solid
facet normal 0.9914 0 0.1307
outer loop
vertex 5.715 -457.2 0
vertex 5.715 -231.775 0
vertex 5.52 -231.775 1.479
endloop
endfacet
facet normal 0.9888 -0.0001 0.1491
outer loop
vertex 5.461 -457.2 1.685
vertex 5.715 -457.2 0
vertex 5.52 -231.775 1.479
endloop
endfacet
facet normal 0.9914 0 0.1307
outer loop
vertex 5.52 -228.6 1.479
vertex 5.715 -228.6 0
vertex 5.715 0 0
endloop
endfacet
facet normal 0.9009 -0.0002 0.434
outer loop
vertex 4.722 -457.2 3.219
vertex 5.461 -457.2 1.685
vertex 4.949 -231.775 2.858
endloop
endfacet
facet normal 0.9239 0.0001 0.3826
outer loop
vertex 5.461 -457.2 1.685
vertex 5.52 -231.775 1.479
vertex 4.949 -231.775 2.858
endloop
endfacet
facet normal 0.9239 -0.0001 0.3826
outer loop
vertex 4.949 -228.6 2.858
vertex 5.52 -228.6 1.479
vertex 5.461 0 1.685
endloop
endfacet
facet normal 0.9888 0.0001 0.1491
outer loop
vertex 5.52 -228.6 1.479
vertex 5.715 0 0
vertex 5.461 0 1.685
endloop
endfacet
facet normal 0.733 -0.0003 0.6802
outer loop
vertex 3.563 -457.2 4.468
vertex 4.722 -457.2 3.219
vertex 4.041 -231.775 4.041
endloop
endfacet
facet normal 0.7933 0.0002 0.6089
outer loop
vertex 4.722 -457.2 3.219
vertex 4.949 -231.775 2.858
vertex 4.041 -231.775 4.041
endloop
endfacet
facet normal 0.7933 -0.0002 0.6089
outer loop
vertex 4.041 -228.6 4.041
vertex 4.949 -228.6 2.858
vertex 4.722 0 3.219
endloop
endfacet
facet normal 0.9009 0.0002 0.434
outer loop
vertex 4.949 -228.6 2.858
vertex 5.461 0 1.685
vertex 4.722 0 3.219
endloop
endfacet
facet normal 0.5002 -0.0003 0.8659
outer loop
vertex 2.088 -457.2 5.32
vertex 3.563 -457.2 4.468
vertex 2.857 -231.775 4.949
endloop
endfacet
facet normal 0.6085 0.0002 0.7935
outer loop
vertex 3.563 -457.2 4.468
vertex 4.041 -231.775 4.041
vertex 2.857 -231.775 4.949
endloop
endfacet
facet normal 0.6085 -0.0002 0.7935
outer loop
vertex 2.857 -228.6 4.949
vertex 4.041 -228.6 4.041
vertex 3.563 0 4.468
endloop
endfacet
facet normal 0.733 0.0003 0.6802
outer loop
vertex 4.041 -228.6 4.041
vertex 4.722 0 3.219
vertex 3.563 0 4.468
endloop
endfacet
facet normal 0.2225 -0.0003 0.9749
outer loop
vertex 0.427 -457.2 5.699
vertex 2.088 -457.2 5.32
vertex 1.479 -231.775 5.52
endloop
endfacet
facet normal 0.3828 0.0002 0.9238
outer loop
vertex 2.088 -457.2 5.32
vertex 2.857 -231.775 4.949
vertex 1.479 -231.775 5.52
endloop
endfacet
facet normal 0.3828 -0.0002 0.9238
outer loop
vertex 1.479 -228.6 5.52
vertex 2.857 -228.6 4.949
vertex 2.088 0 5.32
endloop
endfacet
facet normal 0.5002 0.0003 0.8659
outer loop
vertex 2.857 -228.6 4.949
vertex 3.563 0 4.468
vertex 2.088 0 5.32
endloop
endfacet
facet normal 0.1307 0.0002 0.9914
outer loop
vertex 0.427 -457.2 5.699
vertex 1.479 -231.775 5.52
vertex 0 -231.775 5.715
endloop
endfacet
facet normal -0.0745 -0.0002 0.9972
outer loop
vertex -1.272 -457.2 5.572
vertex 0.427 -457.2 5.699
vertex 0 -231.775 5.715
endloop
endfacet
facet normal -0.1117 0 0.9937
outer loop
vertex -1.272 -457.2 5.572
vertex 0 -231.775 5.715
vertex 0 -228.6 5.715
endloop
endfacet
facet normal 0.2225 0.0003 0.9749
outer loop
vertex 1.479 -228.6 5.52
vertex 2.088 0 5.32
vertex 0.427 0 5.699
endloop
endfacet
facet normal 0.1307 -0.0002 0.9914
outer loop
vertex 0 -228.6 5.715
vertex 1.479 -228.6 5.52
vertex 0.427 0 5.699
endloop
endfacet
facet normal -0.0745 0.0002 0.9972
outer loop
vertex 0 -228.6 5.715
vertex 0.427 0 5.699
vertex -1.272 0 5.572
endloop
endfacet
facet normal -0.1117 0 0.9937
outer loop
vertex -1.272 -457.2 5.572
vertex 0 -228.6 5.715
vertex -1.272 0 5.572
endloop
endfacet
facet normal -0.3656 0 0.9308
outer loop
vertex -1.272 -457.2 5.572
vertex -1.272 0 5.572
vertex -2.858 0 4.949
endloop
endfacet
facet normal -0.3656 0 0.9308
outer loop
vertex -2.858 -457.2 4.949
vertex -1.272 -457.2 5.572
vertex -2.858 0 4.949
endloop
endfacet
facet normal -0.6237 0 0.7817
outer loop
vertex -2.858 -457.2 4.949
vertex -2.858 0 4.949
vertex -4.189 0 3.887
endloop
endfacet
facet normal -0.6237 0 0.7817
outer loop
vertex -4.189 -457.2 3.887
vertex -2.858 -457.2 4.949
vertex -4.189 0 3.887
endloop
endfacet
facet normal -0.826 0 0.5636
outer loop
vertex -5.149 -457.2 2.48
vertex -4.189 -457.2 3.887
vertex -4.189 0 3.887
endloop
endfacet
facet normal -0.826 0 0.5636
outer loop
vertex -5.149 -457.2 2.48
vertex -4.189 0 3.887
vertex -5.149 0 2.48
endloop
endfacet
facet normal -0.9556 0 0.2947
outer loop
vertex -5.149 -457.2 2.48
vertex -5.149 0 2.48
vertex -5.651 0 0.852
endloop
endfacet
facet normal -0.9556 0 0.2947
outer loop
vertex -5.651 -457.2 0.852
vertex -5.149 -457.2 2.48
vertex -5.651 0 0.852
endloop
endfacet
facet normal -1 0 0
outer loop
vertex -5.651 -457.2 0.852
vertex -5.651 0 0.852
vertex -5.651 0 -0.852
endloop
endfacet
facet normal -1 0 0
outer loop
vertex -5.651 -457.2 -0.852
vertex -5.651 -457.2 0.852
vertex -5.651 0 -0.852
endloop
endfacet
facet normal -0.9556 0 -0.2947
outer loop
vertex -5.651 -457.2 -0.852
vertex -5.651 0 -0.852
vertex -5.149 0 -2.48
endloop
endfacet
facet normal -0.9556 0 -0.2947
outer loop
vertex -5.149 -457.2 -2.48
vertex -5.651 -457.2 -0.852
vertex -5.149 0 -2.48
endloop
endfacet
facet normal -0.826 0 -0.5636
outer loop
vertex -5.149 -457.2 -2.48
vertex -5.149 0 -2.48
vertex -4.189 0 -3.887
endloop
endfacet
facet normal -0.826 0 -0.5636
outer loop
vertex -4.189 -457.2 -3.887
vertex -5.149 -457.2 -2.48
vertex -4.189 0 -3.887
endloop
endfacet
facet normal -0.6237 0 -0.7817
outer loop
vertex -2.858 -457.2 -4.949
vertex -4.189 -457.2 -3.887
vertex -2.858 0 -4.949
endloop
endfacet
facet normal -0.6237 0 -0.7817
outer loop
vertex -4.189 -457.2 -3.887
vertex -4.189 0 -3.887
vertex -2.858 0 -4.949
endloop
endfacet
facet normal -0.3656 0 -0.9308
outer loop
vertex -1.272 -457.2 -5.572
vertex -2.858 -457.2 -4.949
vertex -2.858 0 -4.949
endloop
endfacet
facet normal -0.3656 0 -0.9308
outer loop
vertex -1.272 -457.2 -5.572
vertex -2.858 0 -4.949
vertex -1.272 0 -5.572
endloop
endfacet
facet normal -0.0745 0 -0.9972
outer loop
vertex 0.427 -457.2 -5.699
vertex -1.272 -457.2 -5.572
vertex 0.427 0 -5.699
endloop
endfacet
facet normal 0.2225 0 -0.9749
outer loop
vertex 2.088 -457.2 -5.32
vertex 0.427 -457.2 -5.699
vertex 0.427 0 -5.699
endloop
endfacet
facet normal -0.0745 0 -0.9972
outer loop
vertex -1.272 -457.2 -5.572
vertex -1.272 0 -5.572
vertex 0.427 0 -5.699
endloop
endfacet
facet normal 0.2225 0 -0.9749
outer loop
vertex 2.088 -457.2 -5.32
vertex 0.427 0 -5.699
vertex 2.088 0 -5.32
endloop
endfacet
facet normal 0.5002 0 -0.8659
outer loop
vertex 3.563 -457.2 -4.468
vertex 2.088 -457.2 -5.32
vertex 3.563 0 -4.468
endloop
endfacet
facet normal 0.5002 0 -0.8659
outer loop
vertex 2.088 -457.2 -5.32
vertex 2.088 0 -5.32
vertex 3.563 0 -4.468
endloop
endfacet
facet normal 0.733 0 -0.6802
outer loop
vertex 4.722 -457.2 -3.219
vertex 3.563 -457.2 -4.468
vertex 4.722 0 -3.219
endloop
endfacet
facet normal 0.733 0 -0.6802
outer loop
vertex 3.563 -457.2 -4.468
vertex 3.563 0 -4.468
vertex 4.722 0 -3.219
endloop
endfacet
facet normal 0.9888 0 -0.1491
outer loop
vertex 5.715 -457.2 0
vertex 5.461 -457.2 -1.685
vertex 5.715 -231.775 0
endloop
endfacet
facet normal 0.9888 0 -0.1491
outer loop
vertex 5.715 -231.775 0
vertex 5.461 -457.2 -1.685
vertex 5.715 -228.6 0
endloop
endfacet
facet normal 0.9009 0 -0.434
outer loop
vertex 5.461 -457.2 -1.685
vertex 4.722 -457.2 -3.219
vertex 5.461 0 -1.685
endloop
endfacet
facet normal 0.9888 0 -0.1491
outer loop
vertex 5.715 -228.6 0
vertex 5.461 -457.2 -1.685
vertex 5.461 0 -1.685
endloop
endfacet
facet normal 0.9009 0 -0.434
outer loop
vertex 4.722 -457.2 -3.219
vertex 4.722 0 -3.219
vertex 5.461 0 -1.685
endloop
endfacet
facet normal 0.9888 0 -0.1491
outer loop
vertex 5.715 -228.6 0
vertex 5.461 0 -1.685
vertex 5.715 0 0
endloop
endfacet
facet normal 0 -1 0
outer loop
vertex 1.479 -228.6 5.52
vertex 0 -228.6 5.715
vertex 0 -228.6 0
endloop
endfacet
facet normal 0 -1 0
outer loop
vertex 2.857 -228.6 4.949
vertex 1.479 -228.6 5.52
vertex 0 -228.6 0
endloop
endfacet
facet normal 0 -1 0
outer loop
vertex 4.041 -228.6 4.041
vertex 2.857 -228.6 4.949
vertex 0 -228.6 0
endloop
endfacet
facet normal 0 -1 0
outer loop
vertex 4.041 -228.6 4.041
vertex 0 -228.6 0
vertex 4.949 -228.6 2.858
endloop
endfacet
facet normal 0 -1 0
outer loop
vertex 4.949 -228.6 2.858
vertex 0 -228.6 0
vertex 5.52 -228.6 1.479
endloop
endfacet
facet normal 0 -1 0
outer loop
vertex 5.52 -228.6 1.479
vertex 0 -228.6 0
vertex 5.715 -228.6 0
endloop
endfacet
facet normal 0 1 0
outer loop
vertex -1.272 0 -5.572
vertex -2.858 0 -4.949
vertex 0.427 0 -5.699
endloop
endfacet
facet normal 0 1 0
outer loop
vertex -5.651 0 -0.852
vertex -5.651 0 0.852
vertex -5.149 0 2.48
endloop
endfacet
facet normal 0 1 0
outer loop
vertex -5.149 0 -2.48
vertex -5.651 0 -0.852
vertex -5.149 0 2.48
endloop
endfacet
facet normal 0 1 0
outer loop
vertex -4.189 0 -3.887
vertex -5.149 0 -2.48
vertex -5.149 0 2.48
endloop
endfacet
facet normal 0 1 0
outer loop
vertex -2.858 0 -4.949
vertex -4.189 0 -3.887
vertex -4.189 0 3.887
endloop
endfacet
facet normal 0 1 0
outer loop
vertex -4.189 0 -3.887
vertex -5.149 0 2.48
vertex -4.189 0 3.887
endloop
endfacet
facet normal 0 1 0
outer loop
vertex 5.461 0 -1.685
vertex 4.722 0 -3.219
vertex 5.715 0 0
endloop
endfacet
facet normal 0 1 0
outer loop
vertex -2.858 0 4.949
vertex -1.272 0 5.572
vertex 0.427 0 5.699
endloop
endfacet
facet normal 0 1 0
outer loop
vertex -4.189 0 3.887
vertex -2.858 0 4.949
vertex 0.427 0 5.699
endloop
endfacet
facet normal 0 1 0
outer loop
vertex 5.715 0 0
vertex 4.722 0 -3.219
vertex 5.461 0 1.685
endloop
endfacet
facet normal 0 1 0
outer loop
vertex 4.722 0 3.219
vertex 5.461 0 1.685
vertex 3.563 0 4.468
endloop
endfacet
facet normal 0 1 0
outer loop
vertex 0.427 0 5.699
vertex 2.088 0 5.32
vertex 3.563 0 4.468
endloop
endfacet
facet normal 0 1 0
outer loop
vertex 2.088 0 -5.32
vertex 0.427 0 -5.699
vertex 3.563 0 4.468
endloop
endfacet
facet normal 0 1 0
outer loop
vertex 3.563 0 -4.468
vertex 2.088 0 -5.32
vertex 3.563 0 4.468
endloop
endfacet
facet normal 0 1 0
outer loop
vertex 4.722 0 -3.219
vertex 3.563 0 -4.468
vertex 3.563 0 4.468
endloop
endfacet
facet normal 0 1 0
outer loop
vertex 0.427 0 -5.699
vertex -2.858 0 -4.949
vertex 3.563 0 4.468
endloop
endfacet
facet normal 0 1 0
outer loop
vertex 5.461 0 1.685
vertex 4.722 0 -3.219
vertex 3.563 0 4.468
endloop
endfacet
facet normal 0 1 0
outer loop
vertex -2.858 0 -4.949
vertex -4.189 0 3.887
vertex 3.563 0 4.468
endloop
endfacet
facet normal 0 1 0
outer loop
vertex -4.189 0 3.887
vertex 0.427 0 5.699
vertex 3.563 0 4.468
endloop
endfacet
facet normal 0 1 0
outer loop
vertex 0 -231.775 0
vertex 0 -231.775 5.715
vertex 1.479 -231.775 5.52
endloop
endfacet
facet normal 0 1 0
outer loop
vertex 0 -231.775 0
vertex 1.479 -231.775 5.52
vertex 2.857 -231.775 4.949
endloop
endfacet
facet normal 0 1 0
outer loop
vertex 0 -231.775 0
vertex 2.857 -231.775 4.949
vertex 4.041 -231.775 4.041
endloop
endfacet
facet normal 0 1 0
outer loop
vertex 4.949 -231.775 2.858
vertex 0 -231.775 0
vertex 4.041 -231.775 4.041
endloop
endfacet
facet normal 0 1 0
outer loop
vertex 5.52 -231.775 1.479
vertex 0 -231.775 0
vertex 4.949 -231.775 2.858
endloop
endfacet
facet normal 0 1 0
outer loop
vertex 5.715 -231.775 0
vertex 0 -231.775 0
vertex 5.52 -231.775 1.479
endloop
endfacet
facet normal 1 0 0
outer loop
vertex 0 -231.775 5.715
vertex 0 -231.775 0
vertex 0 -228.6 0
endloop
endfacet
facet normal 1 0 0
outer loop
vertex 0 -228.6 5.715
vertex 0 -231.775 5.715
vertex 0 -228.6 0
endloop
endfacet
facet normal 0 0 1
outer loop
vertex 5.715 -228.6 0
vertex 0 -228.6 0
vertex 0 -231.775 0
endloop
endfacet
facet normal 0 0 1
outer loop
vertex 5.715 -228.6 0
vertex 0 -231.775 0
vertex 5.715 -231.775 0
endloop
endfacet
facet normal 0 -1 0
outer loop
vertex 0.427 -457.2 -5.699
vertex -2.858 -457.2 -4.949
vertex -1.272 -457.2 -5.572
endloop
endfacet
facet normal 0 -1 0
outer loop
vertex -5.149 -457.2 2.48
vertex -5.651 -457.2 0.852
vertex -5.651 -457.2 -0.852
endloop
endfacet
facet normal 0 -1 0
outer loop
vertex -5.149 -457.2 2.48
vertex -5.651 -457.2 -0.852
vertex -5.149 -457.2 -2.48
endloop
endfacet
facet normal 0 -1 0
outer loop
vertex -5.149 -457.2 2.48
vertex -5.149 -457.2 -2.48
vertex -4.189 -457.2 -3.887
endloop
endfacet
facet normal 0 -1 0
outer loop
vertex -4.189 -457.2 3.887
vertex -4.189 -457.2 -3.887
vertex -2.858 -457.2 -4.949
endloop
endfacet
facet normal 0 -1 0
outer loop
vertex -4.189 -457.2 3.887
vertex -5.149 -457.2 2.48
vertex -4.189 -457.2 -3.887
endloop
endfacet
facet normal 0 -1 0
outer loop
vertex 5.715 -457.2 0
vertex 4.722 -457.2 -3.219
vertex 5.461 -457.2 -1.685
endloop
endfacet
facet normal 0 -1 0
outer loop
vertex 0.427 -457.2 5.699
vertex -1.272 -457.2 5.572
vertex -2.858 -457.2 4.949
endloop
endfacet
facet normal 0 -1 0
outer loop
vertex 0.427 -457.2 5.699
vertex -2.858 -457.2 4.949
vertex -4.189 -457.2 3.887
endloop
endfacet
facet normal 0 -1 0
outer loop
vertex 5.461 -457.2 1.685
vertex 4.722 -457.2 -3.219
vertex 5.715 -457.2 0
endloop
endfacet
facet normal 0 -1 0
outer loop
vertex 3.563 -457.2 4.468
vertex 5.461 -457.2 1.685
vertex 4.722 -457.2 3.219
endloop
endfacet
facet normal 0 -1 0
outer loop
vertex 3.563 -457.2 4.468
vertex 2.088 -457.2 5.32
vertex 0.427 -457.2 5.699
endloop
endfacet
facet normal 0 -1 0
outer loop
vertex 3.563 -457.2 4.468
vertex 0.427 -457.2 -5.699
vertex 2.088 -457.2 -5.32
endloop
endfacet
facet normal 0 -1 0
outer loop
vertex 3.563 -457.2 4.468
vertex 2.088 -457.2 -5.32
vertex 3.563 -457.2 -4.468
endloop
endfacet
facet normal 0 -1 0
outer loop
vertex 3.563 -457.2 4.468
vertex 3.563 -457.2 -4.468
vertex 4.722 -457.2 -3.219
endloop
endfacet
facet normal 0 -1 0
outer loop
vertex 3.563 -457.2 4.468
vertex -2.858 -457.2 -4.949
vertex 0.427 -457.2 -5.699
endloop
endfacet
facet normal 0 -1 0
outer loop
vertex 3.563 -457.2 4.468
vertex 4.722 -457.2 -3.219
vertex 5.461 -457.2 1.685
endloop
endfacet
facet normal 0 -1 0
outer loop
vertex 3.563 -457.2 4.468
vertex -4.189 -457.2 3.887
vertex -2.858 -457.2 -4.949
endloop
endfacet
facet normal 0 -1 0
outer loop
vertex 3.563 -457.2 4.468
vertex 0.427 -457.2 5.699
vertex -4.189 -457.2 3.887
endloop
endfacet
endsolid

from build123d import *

# Parameters (mm, degrees)
F0_R     = 5.715
F1_DEPTH = 457.2
F2_W     = 6.35
F2_H     = 3.175
F3_DEPTH = 5.716


with BuildPart() as f1:
    # F0 (on Front) → F1 (new body)
    with BuildSketch(Plane.XZ):
        Circle(F0_R)
    extrude(amount=F1_DEPTH)

    # F2 (on Top) → F3 (cut, through all)
    with BuildSketch(Plane.XY):
        with Locations((3.175, -230.1875)):
            Rectangle(F2_W, F2_H)
    extrude(amount=F3_DEPTH, mode=Mode.SUBTRACT)


solid = f1.part
